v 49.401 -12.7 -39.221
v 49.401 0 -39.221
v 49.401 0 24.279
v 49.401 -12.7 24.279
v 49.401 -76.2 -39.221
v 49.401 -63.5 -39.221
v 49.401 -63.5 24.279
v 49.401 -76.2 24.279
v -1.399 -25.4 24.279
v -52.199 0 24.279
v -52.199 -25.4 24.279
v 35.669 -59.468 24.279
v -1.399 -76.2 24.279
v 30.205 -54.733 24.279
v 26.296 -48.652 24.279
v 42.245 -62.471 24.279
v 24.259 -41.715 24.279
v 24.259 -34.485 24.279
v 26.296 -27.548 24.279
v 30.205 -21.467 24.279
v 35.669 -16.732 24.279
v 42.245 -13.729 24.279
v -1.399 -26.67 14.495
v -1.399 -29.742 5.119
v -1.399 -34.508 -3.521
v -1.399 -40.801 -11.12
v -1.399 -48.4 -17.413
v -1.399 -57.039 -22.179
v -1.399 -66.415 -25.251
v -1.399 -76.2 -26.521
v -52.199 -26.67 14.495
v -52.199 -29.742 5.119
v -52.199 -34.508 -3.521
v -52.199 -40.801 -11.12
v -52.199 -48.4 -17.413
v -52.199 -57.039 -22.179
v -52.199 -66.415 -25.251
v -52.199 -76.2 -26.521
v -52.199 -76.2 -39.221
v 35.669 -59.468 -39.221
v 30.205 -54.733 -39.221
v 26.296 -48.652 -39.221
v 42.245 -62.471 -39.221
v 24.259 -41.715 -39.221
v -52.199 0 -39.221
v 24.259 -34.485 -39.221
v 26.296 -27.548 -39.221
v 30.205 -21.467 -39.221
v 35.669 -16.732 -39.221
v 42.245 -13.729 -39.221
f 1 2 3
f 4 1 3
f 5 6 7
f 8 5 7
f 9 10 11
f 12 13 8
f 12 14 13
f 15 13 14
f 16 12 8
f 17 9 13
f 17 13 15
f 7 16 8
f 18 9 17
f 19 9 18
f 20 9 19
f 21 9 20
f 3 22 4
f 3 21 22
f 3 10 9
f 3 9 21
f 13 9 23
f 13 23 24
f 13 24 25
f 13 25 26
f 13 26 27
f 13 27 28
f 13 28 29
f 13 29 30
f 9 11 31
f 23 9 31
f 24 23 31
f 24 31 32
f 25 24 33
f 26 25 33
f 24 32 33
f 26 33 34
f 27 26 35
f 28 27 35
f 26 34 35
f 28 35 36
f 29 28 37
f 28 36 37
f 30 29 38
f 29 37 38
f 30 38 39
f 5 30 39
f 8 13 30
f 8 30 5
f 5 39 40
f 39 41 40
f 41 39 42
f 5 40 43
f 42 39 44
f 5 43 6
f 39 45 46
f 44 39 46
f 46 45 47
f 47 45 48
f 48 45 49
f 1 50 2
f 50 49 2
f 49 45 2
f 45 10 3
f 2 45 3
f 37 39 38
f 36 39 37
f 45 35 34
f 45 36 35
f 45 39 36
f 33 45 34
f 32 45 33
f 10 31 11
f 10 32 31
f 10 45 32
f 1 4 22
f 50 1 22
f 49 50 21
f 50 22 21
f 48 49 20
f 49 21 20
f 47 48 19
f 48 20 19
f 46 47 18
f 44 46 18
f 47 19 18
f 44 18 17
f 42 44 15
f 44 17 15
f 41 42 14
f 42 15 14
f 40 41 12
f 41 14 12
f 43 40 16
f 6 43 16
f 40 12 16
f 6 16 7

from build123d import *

# Parameters (mm, degrees)
F0_W     = 101.6
F0_H     = 63.5
F1_DEPTH = 76.2
F3_DEPTH = 63.5
F5_DEPTH = 50.8


with BuildPart() as f1:
    # F0 (on Front) → F1 (new body)
    with BuildSketch(Plane.XZ):
        with Locations((-1.3990358829, -7.4705901444)):
            Rectangle(F0_W, F0_H)
    extrude(amount=F1_DEPTH)

    # F2 (on face) → F3 (cut)
    with BuildSketch(Plane.XY.offset(24.2794098556)):
        with BuildLine():
            Line((49.4009641171, -63.5), (49.4009641171, -12.7))
            ThreePointArc((49.4009641171, -12.7), (24.0009641171, -38.1), (49.4009641171, -63.5))
        make_face()
    extrude(amount=-F3_DEPTH, mode=Mode.SUBTRACT)

    # F4 (on face) → F5 (cut)
    with BuildSketch(Plane(origin=(-52.1990358829, 0, 0), x_dir=(0, -1, 0), z_dir=(-1, 0, 0))):
        with BuildLine():
            Line((76.2, 24.2794098556), (25.4, 24.2794098556))
            ThreePointArc((25.4, 24.2794098556), (40.8007490362, -11.1198411082), (76.2, -26.5205901444))
            Line((76.2, -26.5205901444), (76.2, 24.2794098556))
        make_face()
    extrude(amount=-F5_DEPTH, mode=Mode.SUBTRACT)


solid = f1.part
